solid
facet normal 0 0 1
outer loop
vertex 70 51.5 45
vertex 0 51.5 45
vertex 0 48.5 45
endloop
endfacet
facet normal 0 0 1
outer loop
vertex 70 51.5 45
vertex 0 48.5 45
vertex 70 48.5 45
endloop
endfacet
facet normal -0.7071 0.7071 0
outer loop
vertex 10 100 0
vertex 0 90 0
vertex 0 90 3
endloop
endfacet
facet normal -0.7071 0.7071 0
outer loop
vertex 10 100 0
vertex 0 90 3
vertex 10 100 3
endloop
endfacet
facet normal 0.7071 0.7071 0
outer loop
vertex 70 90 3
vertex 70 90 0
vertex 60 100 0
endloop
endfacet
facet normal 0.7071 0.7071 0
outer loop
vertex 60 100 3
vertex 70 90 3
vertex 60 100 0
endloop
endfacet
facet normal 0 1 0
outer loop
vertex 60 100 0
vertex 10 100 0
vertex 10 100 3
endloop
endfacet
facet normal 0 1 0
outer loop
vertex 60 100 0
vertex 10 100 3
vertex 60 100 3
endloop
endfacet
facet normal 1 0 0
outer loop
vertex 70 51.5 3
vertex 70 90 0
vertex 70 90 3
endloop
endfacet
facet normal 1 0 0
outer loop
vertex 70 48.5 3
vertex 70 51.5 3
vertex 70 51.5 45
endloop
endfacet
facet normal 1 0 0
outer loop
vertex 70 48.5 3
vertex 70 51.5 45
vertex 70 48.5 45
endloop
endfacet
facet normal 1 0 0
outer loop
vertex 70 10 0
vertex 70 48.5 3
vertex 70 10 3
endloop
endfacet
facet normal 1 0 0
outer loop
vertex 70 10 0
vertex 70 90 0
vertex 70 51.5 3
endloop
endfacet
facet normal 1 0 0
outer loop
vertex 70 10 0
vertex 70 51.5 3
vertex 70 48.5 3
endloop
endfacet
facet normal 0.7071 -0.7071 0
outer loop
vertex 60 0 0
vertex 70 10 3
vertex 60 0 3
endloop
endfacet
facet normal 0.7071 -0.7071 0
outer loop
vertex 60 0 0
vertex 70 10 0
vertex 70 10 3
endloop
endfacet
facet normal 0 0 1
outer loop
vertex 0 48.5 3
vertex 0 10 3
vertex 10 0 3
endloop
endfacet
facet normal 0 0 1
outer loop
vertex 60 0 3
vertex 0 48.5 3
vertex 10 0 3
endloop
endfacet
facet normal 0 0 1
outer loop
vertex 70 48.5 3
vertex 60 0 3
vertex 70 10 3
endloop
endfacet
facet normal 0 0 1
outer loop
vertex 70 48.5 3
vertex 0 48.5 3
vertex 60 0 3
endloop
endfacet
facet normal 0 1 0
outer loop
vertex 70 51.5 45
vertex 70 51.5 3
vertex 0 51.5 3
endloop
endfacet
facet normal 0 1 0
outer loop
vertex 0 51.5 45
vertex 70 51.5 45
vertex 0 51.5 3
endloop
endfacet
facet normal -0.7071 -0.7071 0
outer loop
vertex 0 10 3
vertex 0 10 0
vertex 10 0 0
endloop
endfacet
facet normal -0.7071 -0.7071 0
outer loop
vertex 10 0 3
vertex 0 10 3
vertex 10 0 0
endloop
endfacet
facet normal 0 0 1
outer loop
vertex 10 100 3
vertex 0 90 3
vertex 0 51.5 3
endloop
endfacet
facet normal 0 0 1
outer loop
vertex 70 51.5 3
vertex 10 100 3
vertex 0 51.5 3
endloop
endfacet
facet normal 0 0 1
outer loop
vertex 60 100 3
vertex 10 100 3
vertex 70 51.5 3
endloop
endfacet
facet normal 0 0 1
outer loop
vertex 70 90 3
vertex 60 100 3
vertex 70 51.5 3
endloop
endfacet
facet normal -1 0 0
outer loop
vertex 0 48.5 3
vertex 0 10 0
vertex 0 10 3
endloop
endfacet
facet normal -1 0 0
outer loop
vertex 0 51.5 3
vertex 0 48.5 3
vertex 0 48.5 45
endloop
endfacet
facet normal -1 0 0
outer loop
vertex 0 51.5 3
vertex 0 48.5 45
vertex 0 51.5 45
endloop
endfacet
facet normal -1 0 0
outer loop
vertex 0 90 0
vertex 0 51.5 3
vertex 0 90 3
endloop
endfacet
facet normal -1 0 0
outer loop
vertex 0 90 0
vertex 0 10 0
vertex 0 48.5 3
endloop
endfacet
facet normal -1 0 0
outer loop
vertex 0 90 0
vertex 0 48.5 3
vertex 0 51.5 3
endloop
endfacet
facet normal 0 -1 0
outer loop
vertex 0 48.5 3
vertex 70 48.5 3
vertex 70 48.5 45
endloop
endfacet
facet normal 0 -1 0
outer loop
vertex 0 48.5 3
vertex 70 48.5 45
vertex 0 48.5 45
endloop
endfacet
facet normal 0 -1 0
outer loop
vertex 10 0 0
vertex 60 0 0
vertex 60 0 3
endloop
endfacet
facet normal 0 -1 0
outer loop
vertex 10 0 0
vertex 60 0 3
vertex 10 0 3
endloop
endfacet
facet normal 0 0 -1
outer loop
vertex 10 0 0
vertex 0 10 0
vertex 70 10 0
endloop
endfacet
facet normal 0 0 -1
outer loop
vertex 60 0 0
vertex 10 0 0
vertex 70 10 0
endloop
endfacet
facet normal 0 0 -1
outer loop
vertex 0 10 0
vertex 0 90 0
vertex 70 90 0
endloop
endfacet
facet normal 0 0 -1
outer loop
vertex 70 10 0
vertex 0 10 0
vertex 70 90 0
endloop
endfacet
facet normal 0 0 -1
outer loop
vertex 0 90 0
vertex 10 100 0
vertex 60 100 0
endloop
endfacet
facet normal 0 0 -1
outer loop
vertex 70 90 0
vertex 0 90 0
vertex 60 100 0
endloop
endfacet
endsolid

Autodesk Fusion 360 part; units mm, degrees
sketch "Sketch1" plane through (0, 0, 0) normal (0, 0, 1) x (1, 0, 0)
  line L0 (0, 90) -> (10, 100)
  line L1 (70, 90) -> (60, 100)
  line L2 (0, 10) -> (10, 0)
  line L3 (70, 10) -> (60, 0)
  line L4 (10, 100) -> (60, 100)
  line L5 (70, 90) -> (70, 10)
  line L6 (60, 0) -> (10, 0)
  line L7 (0, 10) -> (0, 90)
  line L8 (70, 51.5) -> (0, 51.5)
  line L9 (70, 48.5) -> (0, 48.5)
extrude "Extrude1" add sketch "Sketch1" along normal blind 3 makes body 1
extrude "Extrude2" add sketch "Sketch1" along normal blind 45 separate body contours L5 L7 L8 L9 makes body 2
combine "Combine1" operation add target body 1 tool bodies 2
